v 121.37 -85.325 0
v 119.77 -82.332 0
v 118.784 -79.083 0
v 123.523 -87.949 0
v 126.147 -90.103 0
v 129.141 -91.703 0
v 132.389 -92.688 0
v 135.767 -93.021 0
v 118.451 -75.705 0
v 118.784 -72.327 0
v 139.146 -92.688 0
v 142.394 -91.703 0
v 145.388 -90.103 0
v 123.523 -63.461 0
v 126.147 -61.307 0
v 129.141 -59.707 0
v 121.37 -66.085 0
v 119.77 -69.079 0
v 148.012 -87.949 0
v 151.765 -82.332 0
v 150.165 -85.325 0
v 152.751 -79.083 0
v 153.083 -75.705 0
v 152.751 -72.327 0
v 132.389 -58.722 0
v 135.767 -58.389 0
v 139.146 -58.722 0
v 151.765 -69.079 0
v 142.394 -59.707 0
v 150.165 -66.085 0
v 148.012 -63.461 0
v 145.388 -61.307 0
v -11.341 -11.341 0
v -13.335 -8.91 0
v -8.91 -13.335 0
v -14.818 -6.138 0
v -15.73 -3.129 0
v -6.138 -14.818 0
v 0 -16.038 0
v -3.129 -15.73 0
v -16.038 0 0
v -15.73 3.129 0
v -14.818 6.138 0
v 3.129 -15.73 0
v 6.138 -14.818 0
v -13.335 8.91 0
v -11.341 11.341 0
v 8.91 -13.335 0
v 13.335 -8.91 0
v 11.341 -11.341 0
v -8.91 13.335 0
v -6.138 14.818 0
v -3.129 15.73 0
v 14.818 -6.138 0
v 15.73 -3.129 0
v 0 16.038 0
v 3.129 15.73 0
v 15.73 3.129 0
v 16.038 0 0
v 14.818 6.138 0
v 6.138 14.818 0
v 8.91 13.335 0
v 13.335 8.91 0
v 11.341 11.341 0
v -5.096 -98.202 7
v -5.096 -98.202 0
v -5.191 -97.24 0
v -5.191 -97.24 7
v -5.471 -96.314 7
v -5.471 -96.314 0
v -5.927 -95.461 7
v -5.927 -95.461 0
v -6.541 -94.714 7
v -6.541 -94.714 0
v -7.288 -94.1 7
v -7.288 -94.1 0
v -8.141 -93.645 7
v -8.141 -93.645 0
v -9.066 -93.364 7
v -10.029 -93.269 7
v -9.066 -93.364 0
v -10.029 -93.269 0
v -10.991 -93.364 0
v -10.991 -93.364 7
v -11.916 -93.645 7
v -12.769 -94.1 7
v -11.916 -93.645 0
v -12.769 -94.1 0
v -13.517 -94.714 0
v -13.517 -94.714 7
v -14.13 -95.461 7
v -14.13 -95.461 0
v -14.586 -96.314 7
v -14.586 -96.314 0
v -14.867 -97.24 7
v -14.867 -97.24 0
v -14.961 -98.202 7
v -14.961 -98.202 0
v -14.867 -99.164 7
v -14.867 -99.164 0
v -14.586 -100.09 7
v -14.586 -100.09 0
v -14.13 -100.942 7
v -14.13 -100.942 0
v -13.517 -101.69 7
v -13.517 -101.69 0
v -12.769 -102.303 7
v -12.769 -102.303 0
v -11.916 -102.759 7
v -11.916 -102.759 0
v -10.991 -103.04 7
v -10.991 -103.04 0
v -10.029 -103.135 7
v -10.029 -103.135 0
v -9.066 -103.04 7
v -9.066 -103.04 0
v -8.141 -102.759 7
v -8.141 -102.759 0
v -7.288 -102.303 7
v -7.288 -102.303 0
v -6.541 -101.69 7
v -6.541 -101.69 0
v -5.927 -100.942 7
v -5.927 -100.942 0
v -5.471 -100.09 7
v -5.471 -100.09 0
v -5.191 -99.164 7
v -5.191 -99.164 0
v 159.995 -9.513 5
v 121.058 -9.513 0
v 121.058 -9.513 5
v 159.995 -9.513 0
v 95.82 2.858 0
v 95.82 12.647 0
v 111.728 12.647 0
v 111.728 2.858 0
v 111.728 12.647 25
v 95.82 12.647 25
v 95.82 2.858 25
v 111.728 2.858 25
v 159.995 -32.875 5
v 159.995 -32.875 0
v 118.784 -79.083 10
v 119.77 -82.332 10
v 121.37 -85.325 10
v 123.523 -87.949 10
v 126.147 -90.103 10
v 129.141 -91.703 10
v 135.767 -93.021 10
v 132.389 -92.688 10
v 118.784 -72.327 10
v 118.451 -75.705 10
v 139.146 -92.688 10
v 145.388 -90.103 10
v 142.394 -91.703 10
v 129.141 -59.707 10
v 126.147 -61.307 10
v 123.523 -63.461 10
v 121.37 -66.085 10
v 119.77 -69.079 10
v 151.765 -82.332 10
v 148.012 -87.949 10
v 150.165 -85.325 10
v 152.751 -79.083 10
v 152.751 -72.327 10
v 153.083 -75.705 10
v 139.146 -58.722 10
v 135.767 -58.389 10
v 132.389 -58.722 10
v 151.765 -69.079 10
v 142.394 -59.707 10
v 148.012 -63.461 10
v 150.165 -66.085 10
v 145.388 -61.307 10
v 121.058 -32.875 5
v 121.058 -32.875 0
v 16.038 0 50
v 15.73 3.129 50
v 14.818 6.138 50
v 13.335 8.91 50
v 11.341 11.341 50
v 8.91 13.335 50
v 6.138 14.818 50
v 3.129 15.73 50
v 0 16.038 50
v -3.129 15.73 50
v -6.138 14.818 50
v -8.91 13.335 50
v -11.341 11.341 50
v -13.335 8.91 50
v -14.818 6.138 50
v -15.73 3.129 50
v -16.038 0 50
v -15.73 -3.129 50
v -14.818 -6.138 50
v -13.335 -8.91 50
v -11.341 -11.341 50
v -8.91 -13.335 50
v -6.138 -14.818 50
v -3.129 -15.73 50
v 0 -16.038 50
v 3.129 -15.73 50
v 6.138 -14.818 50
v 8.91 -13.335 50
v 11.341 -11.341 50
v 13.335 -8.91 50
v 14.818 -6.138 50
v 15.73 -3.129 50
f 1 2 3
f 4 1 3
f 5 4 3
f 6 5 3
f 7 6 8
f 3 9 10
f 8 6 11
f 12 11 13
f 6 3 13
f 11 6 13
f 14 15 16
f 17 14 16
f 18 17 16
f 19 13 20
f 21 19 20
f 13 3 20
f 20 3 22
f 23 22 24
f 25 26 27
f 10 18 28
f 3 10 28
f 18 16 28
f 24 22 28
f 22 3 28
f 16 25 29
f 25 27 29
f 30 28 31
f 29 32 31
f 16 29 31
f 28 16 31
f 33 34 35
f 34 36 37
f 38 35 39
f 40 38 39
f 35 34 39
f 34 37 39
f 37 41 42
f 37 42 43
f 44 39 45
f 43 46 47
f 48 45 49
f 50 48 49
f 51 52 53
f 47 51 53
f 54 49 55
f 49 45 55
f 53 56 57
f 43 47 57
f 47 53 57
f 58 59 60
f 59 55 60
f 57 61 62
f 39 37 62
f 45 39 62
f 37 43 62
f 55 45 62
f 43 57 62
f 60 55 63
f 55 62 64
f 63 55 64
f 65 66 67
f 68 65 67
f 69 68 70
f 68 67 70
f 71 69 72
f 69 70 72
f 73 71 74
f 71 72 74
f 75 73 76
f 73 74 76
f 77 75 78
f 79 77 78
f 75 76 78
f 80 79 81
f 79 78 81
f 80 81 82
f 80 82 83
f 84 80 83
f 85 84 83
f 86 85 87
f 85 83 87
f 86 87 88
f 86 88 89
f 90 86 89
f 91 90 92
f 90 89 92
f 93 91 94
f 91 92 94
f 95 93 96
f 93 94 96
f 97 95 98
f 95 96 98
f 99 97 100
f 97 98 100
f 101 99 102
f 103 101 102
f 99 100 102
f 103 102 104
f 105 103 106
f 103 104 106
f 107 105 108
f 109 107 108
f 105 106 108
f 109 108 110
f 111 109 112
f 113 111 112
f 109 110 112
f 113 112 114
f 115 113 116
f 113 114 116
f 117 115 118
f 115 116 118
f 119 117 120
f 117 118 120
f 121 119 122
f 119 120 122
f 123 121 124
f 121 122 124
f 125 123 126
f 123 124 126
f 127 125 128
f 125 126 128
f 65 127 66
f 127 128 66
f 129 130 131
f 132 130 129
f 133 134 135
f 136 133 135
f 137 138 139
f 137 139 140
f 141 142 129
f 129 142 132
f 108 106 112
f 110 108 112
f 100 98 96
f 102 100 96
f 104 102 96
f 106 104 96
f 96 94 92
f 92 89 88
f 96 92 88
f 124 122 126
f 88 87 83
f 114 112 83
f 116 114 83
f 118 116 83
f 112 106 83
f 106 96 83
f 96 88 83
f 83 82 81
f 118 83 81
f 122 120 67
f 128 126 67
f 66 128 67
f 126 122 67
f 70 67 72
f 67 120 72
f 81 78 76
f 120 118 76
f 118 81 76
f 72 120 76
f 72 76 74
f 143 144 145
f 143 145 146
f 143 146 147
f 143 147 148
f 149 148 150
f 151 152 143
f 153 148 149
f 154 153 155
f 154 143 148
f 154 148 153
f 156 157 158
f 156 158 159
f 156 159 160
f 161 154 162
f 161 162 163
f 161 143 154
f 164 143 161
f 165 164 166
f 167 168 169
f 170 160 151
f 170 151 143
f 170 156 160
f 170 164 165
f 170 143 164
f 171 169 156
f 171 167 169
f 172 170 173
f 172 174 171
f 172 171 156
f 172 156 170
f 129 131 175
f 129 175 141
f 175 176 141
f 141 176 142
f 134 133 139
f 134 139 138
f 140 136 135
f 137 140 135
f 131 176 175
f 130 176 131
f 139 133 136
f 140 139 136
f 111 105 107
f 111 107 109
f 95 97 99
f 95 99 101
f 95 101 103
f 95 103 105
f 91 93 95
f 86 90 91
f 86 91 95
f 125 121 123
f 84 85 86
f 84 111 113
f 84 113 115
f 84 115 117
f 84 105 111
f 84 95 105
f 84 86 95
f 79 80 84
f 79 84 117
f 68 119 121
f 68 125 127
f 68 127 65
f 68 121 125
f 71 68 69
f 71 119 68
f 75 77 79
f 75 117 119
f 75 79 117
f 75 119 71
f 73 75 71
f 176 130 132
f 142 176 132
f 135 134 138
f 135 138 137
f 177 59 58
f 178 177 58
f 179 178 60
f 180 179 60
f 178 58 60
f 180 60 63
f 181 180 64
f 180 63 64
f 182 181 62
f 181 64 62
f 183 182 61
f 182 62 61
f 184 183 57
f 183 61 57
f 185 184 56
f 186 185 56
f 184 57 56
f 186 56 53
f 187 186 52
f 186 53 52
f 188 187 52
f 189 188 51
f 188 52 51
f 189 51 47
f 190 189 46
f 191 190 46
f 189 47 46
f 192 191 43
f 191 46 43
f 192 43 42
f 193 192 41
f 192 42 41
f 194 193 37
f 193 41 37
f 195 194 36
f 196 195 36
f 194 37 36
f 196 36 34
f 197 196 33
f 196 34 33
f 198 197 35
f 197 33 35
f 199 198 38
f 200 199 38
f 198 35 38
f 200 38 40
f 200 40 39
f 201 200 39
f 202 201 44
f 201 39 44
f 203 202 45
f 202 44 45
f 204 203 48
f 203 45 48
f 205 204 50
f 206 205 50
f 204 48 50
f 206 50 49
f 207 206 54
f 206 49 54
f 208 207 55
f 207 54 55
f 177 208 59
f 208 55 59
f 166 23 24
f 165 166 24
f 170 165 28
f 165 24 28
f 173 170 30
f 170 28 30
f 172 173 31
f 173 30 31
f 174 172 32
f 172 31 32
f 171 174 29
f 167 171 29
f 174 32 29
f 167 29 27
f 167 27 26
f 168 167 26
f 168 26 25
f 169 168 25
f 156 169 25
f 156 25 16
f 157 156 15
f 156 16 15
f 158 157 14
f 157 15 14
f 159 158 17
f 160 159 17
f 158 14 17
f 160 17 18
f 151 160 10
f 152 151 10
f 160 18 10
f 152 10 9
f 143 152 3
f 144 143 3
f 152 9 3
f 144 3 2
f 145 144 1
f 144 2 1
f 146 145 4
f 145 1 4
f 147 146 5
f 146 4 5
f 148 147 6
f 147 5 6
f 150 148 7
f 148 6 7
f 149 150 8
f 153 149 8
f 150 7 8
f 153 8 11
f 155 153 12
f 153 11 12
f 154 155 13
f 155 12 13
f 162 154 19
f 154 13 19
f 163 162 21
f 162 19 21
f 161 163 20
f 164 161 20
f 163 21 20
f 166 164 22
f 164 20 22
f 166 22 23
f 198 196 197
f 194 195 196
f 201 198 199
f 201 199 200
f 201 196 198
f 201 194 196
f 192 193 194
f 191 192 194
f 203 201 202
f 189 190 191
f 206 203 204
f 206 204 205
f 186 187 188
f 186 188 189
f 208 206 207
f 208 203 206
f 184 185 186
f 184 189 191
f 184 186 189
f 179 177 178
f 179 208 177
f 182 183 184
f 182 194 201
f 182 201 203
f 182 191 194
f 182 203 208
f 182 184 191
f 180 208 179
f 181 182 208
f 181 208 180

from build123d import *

# Parameters (mm, degrees)
F0_R     = 16.038367
F1_DEPTH = 50
F2_R     = 17.315995
F3_DEPTH = 10
F4_R     = 4.932735
F5_DEPTH = 7
F6_W     = 38.936675
F6_H     = 23.361994
F7_DEPTH = 5
F8_W     = 15.907585
F8_H     = 9.789292
F9_DEPTH = 25


with BuildPart() as f1:
    # F0 (on Top) → F1 (new body)
    with BuildSketch(Plane.XY):
        Circle(F0_R)
    extrude(amount=F1_DEPTH)


with BuildPart() as f3:
    # F2 (on Top) → F3 (new body)
    with BuildSketch(Plane.XY):
        with Locations((135.767445, -75.705171)):
            Circle(F2_R)
    extrude(amount=F3_DEPTH)


with BuildPart() as f5:
    # F4 (on Top) → F5 (new body)
    with BuildSketch(Plane.XY):
        with Locations((-10.028741, -98.201908)):
            Circle(F4_R)
    extrude(amount=F5_DEPTH)


with BuildPart() as f7:
    # F6 (on Top) → F7 (new body)
    with BuildSketch(Plane.XY):
        with Locations((140.526354, -21.193832)):
            Rectangle(F6_W, F6_H)
    extrude(amount=F7_DEPTH)


with BuildPart() as f9:
    # F8 (on Top) → F9 (new body)
    with BuildSketch(Plane.XY):
        with Locations((103.773818, 7.7526)):
            Rectangle(F8_W, F8_H)
    extrude(amount=F9_DEPTH)


solid = Compound([f1.part, f3.part, f5.part, f7.part, f9.part])
